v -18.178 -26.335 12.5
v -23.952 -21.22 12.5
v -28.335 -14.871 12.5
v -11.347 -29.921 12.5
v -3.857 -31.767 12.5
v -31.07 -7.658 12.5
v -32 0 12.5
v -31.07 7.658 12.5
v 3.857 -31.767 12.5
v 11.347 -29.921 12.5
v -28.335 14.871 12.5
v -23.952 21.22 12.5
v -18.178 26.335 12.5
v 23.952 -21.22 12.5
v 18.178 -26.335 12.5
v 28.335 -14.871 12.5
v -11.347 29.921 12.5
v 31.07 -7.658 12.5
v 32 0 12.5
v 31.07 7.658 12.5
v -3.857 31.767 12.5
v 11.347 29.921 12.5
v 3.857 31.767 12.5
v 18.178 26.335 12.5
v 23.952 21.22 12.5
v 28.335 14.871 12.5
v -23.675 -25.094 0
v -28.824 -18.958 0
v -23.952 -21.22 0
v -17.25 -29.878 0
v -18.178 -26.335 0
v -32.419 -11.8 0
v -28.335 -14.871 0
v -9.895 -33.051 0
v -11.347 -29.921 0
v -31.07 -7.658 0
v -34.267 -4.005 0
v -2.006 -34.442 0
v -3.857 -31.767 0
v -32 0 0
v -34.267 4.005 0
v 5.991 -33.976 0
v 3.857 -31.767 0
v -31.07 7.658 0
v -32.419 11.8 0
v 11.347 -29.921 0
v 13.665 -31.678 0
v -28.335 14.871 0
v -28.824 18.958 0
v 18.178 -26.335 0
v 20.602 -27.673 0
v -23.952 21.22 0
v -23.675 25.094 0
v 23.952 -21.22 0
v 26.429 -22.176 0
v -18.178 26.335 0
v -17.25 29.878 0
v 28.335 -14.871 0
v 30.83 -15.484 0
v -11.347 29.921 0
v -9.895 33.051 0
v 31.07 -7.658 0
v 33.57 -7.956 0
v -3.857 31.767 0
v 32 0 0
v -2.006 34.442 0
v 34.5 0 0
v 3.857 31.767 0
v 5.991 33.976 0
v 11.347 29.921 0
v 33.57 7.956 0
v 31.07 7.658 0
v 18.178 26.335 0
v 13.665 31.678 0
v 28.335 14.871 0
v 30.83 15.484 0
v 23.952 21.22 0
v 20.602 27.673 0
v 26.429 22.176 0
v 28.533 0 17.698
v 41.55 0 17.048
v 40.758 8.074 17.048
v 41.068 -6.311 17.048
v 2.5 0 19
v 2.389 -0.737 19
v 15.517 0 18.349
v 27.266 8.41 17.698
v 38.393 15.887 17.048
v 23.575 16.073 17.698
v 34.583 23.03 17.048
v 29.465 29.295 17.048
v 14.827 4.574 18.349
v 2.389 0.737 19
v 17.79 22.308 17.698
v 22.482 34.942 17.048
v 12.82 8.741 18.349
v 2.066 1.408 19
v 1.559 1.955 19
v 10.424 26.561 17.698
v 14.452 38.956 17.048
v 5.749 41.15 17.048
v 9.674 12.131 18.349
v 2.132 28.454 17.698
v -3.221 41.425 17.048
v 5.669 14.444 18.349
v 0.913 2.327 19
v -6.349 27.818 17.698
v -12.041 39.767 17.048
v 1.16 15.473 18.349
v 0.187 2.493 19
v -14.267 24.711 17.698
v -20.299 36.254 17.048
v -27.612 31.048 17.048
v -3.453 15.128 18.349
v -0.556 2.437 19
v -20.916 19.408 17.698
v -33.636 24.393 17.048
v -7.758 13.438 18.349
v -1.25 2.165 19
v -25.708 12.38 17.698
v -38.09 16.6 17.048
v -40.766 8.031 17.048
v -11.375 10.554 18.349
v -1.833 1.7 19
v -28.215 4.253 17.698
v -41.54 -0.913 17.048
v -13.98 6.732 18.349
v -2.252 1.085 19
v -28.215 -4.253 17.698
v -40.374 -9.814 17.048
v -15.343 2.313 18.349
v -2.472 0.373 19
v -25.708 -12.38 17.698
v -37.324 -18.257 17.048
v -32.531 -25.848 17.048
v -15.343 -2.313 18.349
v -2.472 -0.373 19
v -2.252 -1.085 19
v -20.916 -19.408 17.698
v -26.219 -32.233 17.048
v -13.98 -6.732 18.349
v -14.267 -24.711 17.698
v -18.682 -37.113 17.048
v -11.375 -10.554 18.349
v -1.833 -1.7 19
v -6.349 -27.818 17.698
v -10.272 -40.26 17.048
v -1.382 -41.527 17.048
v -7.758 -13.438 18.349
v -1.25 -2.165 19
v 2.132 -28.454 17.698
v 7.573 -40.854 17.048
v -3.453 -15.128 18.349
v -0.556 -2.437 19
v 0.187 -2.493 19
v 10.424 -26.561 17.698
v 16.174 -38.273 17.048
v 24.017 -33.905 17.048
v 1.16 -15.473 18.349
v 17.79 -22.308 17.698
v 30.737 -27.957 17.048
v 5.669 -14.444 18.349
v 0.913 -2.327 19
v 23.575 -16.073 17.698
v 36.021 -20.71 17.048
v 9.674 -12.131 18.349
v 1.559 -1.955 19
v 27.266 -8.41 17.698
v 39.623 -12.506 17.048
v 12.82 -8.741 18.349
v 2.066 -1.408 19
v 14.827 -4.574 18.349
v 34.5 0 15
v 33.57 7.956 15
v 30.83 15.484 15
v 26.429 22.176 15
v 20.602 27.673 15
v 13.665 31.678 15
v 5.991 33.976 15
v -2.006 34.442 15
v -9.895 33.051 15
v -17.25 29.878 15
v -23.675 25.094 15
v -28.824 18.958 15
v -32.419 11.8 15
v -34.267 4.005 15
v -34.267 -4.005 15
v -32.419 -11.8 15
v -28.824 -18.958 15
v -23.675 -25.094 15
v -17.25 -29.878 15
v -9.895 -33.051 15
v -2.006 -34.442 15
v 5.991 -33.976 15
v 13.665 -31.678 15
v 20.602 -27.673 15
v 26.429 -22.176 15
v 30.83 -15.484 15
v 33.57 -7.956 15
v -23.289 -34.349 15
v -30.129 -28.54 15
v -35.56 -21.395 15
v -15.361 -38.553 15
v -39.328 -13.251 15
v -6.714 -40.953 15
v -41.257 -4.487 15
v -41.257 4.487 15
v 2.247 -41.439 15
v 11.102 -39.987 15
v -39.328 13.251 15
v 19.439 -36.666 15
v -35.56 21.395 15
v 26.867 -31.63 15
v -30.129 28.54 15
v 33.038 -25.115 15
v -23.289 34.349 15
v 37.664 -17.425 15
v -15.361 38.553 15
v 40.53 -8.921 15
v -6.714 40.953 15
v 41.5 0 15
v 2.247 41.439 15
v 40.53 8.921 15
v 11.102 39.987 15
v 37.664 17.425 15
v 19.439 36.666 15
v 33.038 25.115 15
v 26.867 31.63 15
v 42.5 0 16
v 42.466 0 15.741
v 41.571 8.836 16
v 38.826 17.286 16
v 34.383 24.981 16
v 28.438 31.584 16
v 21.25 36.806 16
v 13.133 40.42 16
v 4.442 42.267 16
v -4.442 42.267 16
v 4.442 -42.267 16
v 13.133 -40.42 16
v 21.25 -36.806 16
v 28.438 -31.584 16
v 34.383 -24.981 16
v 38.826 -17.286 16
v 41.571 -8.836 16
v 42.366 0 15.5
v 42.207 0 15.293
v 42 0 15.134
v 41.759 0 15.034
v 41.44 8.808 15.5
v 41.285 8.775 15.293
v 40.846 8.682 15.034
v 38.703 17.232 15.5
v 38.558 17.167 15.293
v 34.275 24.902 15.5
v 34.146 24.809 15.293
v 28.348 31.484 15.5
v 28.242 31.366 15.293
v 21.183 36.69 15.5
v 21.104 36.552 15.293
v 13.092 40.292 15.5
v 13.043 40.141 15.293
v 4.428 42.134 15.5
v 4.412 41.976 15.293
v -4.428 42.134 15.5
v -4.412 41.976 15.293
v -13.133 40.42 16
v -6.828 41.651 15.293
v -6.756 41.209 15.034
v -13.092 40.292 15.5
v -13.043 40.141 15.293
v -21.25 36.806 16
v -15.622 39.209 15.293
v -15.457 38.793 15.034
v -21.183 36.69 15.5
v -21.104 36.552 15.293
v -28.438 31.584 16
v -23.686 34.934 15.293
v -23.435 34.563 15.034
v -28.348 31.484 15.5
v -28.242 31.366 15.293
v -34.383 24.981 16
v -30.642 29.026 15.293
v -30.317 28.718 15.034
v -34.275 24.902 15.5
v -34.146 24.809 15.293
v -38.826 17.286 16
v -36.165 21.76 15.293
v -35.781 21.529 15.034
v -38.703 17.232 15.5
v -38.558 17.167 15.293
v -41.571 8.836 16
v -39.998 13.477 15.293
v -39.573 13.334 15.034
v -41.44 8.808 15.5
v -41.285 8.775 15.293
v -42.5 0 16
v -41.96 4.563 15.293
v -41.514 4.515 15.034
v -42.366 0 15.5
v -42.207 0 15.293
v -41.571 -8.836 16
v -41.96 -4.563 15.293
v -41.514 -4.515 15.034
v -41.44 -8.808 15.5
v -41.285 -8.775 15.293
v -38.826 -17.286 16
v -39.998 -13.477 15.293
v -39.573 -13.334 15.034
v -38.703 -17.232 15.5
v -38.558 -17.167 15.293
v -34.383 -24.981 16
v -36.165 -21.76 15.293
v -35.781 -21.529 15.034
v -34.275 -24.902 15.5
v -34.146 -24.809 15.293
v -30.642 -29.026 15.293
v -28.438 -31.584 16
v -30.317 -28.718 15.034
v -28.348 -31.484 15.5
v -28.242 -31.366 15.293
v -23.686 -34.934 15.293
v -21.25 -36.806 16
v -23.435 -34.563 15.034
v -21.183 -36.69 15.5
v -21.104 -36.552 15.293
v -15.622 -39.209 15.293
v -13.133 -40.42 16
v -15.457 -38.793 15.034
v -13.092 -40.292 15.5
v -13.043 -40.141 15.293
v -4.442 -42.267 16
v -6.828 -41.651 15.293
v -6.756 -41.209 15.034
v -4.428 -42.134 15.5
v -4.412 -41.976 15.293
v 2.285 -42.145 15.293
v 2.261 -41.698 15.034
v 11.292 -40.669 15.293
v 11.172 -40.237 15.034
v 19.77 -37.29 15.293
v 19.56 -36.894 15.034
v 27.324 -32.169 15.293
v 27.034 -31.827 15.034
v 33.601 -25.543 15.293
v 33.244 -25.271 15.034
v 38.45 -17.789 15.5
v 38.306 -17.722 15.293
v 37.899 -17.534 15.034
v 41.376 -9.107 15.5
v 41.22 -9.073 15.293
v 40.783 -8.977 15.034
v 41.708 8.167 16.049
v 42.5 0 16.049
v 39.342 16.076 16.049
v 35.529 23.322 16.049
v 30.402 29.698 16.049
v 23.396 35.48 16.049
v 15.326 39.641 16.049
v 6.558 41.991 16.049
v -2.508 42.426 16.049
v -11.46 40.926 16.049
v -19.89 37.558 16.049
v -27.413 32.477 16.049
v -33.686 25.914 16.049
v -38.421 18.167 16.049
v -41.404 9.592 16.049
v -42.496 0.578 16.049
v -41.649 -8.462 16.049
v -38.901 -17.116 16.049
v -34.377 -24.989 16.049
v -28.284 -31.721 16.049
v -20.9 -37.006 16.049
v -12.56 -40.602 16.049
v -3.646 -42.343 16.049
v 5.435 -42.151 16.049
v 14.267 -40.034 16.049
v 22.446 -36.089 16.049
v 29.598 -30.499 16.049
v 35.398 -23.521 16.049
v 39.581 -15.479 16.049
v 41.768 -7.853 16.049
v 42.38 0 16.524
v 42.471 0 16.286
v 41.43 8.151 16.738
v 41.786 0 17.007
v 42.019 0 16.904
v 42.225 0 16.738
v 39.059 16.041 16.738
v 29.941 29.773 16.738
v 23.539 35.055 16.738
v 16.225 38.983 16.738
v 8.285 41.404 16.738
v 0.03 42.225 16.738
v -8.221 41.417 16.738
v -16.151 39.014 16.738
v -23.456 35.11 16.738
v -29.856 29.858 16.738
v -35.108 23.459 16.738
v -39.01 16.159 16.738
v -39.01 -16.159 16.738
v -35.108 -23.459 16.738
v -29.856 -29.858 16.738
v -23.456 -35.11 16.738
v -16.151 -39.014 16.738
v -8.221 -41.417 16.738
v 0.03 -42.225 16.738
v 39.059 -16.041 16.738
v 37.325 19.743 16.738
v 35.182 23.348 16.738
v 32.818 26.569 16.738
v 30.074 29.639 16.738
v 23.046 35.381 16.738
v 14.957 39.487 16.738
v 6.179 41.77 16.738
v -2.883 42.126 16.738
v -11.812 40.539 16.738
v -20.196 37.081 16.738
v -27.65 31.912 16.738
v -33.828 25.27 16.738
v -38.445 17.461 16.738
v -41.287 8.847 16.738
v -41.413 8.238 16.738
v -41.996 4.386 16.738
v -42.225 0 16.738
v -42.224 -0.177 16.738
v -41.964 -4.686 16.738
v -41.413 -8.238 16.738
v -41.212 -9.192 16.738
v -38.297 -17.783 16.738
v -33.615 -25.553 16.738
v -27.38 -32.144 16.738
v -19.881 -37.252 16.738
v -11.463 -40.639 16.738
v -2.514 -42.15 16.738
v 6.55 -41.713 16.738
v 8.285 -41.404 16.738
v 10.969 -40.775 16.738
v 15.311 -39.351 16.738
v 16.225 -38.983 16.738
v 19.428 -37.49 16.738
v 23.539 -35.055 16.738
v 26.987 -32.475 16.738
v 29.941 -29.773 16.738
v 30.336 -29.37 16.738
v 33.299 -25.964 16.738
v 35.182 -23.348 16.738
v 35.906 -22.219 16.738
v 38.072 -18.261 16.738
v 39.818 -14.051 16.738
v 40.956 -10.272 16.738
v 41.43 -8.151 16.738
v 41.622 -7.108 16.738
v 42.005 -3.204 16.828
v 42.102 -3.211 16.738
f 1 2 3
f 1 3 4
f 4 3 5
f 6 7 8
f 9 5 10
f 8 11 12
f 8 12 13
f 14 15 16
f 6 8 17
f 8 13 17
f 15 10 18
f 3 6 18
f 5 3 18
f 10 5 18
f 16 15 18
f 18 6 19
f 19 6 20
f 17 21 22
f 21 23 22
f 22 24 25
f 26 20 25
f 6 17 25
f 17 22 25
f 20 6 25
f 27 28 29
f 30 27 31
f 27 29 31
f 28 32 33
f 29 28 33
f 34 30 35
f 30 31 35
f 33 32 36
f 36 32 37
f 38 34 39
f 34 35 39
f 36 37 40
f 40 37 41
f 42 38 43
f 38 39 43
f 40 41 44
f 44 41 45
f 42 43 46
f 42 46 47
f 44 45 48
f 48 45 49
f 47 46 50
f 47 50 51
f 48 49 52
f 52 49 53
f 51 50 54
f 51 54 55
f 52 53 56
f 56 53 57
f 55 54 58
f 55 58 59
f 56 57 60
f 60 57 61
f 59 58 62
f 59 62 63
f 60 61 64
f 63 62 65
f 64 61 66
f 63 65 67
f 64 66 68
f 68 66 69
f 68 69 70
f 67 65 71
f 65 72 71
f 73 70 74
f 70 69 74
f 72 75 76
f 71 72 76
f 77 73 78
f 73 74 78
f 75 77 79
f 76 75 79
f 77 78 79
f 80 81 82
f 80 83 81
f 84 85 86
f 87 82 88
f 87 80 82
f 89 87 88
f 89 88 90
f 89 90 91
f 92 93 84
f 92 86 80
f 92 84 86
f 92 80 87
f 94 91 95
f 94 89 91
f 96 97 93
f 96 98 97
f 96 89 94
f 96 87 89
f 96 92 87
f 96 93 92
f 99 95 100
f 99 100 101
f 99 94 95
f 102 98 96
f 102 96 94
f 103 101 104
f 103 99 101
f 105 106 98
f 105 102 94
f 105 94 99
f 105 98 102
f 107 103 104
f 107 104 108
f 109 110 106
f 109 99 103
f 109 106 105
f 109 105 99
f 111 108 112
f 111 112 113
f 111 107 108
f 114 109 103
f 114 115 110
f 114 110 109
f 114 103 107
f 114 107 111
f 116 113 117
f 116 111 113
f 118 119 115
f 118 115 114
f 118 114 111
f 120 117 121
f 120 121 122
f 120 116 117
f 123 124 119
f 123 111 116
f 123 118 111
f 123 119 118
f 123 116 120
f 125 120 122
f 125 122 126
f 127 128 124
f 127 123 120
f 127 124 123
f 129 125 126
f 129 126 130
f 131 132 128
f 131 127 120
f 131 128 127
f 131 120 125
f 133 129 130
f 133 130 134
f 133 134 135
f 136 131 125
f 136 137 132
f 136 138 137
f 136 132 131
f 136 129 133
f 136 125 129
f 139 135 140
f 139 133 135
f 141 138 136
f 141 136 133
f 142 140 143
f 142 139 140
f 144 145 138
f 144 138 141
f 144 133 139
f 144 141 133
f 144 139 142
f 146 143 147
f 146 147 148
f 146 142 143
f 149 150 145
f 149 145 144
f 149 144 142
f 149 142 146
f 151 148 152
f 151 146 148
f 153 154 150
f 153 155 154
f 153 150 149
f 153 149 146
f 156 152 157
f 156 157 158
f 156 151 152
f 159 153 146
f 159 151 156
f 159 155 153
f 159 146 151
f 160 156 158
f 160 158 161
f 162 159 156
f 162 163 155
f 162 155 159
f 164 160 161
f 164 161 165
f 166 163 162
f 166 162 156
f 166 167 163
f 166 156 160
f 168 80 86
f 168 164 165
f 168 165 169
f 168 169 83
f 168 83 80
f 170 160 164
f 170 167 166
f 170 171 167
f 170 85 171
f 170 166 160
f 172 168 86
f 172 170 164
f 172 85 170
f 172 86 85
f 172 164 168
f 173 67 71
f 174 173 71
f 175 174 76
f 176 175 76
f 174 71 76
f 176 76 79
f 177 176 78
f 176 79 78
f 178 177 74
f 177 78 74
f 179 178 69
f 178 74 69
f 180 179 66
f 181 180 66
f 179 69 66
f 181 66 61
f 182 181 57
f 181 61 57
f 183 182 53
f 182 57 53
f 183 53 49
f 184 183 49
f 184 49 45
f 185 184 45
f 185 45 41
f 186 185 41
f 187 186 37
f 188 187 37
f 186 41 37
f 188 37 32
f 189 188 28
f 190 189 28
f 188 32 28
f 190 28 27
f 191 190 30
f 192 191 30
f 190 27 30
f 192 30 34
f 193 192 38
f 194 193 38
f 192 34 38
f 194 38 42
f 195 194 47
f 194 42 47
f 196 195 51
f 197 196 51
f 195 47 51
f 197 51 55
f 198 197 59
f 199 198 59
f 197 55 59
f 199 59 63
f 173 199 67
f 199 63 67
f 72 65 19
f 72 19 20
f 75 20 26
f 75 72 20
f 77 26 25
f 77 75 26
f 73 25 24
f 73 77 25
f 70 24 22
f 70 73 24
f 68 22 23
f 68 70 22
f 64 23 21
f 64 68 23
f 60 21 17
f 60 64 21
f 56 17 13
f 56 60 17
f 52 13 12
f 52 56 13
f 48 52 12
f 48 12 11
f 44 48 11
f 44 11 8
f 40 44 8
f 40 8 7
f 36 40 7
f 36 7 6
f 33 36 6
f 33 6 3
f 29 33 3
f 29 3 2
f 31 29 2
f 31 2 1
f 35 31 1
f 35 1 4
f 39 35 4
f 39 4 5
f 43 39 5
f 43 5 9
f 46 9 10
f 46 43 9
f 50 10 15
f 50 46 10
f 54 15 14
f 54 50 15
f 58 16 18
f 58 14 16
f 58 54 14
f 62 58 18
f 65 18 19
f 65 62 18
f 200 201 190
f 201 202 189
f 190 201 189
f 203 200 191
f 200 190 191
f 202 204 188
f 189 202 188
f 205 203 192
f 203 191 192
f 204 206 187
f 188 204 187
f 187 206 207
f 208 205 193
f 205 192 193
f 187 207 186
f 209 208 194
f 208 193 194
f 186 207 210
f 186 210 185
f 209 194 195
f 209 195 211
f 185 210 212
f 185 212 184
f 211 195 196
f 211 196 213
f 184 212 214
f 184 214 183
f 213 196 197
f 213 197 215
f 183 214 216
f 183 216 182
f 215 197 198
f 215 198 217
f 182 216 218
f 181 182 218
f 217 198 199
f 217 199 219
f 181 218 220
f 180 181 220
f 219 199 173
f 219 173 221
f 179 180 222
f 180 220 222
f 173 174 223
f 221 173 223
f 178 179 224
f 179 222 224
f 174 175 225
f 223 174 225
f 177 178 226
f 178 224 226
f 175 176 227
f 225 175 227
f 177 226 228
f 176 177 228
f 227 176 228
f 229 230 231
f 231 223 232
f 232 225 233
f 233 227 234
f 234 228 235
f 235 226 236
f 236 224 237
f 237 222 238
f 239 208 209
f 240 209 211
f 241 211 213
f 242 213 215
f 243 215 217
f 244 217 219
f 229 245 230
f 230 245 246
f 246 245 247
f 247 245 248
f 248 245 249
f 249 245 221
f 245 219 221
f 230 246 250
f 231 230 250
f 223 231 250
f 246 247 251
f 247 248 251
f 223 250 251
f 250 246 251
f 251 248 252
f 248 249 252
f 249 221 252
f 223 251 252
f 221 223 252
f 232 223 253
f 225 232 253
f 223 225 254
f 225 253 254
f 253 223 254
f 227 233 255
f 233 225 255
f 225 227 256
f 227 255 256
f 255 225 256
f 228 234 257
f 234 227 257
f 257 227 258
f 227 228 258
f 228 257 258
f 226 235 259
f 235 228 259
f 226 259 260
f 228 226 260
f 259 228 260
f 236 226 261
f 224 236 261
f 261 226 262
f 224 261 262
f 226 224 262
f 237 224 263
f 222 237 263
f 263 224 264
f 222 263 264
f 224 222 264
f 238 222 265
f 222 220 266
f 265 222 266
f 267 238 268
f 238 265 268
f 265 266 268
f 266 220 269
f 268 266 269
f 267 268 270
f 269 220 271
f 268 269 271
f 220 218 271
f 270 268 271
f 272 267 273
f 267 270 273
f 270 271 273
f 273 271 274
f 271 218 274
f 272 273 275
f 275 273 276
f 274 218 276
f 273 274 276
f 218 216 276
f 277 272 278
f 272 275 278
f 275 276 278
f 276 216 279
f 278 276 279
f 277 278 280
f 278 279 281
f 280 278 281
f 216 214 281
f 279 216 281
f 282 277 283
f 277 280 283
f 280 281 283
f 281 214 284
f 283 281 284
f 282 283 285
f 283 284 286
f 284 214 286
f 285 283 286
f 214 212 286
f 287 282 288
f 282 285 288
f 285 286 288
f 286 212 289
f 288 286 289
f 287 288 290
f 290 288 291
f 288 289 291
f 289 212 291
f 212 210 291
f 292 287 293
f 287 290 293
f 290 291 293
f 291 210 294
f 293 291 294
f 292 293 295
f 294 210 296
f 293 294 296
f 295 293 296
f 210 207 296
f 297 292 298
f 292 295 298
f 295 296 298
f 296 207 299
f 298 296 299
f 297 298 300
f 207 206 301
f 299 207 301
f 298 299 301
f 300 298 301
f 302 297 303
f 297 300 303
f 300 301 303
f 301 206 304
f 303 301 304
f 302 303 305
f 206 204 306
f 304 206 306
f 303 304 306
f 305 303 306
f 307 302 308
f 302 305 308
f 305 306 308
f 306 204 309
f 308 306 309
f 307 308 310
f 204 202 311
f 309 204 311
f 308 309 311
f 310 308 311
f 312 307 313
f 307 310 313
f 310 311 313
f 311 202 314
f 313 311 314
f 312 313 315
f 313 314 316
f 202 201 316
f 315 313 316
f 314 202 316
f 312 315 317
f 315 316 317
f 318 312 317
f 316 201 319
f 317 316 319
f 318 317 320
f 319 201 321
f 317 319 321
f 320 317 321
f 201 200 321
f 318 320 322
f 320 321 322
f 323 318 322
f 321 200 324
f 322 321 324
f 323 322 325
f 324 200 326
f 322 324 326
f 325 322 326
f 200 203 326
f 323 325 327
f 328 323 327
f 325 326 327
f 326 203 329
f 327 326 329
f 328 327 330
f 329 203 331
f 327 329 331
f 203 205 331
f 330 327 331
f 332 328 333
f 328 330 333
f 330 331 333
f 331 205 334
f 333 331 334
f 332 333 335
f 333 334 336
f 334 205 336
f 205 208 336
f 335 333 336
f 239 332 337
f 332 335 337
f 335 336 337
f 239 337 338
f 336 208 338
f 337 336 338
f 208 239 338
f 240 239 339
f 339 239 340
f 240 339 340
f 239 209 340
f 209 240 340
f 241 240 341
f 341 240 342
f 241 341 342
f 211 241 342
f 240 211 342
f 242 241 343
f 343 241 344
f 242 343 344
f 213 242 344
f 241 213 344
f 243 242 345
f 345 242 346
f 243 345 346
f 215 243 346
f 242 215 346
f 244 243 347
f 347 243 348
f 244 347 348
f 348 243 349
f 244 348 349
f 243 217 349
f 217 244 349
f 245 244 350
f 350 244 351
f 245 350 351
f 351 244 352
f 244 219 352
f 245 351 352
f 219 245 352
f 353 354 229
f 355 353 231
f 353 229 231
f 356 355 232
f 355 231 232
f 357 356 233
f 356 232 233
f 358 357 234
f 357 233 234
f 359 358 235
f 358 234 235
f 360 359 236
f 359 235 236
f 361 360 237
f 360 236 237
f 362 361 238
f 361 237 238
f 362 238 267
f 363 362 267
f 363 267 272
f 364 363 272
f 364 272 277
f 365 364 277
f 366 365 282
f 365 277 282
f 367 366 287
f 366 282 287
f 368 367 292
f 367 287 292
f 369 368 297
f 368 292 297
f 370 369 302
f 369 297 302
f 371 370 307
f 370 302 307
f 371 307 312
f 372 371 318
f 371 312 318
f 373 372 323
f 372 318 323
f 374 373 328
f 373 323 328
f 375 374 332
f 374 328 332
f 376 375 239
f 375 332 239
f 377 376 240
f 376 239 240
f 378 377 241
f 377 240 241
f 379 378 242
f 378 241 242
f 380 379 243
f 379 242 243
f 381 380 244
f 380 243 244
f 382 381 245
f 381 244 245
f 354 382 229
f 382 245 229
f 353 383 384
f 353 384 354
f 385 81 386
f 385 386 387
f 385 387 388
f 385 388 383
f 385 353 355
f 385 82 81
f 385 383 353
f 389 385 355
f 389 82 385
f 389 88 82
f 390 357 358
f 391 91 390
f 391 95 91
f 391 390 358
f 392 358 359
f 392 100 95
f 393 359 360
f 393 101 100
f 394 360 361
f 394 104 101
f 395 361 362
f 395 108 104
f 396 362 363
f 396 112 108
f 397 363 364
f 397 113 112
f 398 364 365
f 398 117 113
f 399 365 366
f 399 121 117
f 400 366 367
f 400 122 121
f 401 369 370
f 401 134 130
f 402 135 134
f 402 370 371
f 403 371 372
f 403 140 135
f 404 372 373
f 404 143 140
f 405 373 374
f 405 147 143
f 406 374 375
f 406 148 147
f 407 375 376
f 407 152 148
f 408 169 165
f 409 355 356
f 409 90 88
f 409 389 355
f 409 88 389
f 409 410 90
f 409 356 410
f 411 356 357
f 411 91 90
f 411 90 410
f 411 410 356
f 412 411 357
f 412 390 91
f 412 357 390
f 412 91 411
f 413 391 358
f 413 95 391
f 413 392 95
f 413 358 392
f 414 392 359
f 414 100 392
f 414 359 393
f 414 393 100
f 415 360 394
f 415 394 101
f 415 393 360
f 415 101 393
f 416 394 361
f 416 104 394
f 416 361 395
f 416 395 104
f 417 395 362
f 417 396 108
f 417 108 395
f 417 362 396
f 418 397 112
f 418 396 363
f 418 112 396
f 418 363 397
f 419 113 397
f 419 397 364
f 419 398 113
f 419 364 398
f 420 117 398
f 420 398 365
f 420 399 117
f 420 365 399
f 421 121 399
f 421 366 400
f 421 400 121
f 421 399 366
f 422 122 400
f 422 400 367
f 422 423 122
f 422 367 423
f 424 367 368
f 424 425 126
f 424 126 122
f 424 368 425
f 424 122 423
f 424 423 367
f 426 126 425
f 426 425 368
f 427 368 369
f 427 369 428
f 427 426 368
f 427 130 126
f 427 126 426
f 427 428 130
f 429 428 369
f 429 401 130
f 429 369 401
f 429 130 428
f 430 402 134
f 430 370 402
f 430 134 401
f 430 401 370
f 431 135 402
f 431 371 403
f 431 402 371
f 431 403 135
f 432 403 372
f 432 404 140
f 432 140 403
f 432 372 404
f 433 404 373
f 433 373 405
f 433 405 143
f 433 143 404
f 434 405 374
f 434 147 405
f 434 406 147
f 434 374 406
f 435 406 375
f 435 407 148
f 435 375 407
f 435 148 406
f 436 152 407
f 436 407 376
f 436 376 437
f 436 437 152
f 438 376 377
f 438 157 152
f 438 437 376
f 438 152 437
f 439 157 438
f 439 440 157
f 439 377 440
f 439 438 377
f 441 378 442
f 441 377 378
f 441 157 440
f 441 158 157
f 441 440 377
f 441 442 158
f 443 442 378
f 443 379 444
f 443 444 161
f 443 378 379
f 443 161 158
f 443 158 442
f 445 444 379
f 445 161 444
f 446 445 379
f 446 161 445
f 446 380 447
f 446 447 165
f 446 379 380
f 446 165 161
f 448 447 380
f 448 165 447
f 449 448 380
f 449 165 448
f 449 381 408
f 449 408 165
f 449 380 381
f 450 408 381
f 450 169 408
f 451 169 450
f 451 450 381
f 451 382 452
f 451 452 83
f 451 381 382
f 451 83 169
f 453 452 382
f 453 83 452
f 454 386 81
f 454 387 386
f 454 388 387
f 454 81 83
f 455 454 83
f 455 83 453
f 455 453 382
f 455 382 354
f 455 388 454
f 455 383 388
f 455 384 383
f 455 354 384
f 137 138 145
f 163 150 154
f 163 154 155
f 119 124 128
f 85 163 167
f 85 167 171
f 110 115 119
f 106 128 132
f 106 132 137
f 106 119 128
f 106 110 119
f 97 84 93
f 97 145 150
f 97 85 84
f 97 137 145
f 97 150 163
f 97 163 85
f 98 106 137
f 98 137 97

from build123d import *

# Parameters (mm, degrees)
F0_R      = 34.5
F1_DEPTH  = 15
F2_T      = -2.5
F3_R      = 42.5
F3_R_2    = 34.5
F4_DEPTH  = 2
F4_FACE_R = 42.5
F6_R      = 2.5
F8_R      = 1
F9_R      = 1


with BuildPart() as f1:
    # F0 (on Top) → F1 (new body)
    with BuildSketch(Plane.XY):
        Circle(F0_R)
    extrude(amount=F1_DEPTH)

    # F2
    f2_openings = [f1.faces().sort_by_distance(p)[0] for p in [
        (0, 0, 0),
    ]]
    offset(amount=F2_T, openings=f2_openings)

    # F3 (on face) → F4 (join)
    with BuildSketch(Plane.XY.offset(15)):
        Circle(F3_R)
        Circle(F3_R_2, mode=Mode.SUBTRACT)
        Circle(F3_R_2)
    extrude(amount=F4_DEPTH)

    # F4_face (on face) → F7 section 0
    with BuildSketch(Plane.XY.offset(17)):
        Circle(F4_FACE_R)
    # F6 (on offset) → F7 section 1
    with BuildSketch(Plane.XY.offset(19)):
        Circle(F6_R)
    loft()

    # F8
    f8_edges = [f1.edges().sort_by_distance(p)[0] for p in [
        (-42.5, 0, 17),
    ]]
    fillet(f8_edges, radius=F8_R)

    # F9
    f9_edges = [f1.edges().sort_by_distance(p)[0] for p in [
        (-42.5, 0, 15),
    ]]
    fillet(f9_edges, radius=F9_R)


solid = f1.part
